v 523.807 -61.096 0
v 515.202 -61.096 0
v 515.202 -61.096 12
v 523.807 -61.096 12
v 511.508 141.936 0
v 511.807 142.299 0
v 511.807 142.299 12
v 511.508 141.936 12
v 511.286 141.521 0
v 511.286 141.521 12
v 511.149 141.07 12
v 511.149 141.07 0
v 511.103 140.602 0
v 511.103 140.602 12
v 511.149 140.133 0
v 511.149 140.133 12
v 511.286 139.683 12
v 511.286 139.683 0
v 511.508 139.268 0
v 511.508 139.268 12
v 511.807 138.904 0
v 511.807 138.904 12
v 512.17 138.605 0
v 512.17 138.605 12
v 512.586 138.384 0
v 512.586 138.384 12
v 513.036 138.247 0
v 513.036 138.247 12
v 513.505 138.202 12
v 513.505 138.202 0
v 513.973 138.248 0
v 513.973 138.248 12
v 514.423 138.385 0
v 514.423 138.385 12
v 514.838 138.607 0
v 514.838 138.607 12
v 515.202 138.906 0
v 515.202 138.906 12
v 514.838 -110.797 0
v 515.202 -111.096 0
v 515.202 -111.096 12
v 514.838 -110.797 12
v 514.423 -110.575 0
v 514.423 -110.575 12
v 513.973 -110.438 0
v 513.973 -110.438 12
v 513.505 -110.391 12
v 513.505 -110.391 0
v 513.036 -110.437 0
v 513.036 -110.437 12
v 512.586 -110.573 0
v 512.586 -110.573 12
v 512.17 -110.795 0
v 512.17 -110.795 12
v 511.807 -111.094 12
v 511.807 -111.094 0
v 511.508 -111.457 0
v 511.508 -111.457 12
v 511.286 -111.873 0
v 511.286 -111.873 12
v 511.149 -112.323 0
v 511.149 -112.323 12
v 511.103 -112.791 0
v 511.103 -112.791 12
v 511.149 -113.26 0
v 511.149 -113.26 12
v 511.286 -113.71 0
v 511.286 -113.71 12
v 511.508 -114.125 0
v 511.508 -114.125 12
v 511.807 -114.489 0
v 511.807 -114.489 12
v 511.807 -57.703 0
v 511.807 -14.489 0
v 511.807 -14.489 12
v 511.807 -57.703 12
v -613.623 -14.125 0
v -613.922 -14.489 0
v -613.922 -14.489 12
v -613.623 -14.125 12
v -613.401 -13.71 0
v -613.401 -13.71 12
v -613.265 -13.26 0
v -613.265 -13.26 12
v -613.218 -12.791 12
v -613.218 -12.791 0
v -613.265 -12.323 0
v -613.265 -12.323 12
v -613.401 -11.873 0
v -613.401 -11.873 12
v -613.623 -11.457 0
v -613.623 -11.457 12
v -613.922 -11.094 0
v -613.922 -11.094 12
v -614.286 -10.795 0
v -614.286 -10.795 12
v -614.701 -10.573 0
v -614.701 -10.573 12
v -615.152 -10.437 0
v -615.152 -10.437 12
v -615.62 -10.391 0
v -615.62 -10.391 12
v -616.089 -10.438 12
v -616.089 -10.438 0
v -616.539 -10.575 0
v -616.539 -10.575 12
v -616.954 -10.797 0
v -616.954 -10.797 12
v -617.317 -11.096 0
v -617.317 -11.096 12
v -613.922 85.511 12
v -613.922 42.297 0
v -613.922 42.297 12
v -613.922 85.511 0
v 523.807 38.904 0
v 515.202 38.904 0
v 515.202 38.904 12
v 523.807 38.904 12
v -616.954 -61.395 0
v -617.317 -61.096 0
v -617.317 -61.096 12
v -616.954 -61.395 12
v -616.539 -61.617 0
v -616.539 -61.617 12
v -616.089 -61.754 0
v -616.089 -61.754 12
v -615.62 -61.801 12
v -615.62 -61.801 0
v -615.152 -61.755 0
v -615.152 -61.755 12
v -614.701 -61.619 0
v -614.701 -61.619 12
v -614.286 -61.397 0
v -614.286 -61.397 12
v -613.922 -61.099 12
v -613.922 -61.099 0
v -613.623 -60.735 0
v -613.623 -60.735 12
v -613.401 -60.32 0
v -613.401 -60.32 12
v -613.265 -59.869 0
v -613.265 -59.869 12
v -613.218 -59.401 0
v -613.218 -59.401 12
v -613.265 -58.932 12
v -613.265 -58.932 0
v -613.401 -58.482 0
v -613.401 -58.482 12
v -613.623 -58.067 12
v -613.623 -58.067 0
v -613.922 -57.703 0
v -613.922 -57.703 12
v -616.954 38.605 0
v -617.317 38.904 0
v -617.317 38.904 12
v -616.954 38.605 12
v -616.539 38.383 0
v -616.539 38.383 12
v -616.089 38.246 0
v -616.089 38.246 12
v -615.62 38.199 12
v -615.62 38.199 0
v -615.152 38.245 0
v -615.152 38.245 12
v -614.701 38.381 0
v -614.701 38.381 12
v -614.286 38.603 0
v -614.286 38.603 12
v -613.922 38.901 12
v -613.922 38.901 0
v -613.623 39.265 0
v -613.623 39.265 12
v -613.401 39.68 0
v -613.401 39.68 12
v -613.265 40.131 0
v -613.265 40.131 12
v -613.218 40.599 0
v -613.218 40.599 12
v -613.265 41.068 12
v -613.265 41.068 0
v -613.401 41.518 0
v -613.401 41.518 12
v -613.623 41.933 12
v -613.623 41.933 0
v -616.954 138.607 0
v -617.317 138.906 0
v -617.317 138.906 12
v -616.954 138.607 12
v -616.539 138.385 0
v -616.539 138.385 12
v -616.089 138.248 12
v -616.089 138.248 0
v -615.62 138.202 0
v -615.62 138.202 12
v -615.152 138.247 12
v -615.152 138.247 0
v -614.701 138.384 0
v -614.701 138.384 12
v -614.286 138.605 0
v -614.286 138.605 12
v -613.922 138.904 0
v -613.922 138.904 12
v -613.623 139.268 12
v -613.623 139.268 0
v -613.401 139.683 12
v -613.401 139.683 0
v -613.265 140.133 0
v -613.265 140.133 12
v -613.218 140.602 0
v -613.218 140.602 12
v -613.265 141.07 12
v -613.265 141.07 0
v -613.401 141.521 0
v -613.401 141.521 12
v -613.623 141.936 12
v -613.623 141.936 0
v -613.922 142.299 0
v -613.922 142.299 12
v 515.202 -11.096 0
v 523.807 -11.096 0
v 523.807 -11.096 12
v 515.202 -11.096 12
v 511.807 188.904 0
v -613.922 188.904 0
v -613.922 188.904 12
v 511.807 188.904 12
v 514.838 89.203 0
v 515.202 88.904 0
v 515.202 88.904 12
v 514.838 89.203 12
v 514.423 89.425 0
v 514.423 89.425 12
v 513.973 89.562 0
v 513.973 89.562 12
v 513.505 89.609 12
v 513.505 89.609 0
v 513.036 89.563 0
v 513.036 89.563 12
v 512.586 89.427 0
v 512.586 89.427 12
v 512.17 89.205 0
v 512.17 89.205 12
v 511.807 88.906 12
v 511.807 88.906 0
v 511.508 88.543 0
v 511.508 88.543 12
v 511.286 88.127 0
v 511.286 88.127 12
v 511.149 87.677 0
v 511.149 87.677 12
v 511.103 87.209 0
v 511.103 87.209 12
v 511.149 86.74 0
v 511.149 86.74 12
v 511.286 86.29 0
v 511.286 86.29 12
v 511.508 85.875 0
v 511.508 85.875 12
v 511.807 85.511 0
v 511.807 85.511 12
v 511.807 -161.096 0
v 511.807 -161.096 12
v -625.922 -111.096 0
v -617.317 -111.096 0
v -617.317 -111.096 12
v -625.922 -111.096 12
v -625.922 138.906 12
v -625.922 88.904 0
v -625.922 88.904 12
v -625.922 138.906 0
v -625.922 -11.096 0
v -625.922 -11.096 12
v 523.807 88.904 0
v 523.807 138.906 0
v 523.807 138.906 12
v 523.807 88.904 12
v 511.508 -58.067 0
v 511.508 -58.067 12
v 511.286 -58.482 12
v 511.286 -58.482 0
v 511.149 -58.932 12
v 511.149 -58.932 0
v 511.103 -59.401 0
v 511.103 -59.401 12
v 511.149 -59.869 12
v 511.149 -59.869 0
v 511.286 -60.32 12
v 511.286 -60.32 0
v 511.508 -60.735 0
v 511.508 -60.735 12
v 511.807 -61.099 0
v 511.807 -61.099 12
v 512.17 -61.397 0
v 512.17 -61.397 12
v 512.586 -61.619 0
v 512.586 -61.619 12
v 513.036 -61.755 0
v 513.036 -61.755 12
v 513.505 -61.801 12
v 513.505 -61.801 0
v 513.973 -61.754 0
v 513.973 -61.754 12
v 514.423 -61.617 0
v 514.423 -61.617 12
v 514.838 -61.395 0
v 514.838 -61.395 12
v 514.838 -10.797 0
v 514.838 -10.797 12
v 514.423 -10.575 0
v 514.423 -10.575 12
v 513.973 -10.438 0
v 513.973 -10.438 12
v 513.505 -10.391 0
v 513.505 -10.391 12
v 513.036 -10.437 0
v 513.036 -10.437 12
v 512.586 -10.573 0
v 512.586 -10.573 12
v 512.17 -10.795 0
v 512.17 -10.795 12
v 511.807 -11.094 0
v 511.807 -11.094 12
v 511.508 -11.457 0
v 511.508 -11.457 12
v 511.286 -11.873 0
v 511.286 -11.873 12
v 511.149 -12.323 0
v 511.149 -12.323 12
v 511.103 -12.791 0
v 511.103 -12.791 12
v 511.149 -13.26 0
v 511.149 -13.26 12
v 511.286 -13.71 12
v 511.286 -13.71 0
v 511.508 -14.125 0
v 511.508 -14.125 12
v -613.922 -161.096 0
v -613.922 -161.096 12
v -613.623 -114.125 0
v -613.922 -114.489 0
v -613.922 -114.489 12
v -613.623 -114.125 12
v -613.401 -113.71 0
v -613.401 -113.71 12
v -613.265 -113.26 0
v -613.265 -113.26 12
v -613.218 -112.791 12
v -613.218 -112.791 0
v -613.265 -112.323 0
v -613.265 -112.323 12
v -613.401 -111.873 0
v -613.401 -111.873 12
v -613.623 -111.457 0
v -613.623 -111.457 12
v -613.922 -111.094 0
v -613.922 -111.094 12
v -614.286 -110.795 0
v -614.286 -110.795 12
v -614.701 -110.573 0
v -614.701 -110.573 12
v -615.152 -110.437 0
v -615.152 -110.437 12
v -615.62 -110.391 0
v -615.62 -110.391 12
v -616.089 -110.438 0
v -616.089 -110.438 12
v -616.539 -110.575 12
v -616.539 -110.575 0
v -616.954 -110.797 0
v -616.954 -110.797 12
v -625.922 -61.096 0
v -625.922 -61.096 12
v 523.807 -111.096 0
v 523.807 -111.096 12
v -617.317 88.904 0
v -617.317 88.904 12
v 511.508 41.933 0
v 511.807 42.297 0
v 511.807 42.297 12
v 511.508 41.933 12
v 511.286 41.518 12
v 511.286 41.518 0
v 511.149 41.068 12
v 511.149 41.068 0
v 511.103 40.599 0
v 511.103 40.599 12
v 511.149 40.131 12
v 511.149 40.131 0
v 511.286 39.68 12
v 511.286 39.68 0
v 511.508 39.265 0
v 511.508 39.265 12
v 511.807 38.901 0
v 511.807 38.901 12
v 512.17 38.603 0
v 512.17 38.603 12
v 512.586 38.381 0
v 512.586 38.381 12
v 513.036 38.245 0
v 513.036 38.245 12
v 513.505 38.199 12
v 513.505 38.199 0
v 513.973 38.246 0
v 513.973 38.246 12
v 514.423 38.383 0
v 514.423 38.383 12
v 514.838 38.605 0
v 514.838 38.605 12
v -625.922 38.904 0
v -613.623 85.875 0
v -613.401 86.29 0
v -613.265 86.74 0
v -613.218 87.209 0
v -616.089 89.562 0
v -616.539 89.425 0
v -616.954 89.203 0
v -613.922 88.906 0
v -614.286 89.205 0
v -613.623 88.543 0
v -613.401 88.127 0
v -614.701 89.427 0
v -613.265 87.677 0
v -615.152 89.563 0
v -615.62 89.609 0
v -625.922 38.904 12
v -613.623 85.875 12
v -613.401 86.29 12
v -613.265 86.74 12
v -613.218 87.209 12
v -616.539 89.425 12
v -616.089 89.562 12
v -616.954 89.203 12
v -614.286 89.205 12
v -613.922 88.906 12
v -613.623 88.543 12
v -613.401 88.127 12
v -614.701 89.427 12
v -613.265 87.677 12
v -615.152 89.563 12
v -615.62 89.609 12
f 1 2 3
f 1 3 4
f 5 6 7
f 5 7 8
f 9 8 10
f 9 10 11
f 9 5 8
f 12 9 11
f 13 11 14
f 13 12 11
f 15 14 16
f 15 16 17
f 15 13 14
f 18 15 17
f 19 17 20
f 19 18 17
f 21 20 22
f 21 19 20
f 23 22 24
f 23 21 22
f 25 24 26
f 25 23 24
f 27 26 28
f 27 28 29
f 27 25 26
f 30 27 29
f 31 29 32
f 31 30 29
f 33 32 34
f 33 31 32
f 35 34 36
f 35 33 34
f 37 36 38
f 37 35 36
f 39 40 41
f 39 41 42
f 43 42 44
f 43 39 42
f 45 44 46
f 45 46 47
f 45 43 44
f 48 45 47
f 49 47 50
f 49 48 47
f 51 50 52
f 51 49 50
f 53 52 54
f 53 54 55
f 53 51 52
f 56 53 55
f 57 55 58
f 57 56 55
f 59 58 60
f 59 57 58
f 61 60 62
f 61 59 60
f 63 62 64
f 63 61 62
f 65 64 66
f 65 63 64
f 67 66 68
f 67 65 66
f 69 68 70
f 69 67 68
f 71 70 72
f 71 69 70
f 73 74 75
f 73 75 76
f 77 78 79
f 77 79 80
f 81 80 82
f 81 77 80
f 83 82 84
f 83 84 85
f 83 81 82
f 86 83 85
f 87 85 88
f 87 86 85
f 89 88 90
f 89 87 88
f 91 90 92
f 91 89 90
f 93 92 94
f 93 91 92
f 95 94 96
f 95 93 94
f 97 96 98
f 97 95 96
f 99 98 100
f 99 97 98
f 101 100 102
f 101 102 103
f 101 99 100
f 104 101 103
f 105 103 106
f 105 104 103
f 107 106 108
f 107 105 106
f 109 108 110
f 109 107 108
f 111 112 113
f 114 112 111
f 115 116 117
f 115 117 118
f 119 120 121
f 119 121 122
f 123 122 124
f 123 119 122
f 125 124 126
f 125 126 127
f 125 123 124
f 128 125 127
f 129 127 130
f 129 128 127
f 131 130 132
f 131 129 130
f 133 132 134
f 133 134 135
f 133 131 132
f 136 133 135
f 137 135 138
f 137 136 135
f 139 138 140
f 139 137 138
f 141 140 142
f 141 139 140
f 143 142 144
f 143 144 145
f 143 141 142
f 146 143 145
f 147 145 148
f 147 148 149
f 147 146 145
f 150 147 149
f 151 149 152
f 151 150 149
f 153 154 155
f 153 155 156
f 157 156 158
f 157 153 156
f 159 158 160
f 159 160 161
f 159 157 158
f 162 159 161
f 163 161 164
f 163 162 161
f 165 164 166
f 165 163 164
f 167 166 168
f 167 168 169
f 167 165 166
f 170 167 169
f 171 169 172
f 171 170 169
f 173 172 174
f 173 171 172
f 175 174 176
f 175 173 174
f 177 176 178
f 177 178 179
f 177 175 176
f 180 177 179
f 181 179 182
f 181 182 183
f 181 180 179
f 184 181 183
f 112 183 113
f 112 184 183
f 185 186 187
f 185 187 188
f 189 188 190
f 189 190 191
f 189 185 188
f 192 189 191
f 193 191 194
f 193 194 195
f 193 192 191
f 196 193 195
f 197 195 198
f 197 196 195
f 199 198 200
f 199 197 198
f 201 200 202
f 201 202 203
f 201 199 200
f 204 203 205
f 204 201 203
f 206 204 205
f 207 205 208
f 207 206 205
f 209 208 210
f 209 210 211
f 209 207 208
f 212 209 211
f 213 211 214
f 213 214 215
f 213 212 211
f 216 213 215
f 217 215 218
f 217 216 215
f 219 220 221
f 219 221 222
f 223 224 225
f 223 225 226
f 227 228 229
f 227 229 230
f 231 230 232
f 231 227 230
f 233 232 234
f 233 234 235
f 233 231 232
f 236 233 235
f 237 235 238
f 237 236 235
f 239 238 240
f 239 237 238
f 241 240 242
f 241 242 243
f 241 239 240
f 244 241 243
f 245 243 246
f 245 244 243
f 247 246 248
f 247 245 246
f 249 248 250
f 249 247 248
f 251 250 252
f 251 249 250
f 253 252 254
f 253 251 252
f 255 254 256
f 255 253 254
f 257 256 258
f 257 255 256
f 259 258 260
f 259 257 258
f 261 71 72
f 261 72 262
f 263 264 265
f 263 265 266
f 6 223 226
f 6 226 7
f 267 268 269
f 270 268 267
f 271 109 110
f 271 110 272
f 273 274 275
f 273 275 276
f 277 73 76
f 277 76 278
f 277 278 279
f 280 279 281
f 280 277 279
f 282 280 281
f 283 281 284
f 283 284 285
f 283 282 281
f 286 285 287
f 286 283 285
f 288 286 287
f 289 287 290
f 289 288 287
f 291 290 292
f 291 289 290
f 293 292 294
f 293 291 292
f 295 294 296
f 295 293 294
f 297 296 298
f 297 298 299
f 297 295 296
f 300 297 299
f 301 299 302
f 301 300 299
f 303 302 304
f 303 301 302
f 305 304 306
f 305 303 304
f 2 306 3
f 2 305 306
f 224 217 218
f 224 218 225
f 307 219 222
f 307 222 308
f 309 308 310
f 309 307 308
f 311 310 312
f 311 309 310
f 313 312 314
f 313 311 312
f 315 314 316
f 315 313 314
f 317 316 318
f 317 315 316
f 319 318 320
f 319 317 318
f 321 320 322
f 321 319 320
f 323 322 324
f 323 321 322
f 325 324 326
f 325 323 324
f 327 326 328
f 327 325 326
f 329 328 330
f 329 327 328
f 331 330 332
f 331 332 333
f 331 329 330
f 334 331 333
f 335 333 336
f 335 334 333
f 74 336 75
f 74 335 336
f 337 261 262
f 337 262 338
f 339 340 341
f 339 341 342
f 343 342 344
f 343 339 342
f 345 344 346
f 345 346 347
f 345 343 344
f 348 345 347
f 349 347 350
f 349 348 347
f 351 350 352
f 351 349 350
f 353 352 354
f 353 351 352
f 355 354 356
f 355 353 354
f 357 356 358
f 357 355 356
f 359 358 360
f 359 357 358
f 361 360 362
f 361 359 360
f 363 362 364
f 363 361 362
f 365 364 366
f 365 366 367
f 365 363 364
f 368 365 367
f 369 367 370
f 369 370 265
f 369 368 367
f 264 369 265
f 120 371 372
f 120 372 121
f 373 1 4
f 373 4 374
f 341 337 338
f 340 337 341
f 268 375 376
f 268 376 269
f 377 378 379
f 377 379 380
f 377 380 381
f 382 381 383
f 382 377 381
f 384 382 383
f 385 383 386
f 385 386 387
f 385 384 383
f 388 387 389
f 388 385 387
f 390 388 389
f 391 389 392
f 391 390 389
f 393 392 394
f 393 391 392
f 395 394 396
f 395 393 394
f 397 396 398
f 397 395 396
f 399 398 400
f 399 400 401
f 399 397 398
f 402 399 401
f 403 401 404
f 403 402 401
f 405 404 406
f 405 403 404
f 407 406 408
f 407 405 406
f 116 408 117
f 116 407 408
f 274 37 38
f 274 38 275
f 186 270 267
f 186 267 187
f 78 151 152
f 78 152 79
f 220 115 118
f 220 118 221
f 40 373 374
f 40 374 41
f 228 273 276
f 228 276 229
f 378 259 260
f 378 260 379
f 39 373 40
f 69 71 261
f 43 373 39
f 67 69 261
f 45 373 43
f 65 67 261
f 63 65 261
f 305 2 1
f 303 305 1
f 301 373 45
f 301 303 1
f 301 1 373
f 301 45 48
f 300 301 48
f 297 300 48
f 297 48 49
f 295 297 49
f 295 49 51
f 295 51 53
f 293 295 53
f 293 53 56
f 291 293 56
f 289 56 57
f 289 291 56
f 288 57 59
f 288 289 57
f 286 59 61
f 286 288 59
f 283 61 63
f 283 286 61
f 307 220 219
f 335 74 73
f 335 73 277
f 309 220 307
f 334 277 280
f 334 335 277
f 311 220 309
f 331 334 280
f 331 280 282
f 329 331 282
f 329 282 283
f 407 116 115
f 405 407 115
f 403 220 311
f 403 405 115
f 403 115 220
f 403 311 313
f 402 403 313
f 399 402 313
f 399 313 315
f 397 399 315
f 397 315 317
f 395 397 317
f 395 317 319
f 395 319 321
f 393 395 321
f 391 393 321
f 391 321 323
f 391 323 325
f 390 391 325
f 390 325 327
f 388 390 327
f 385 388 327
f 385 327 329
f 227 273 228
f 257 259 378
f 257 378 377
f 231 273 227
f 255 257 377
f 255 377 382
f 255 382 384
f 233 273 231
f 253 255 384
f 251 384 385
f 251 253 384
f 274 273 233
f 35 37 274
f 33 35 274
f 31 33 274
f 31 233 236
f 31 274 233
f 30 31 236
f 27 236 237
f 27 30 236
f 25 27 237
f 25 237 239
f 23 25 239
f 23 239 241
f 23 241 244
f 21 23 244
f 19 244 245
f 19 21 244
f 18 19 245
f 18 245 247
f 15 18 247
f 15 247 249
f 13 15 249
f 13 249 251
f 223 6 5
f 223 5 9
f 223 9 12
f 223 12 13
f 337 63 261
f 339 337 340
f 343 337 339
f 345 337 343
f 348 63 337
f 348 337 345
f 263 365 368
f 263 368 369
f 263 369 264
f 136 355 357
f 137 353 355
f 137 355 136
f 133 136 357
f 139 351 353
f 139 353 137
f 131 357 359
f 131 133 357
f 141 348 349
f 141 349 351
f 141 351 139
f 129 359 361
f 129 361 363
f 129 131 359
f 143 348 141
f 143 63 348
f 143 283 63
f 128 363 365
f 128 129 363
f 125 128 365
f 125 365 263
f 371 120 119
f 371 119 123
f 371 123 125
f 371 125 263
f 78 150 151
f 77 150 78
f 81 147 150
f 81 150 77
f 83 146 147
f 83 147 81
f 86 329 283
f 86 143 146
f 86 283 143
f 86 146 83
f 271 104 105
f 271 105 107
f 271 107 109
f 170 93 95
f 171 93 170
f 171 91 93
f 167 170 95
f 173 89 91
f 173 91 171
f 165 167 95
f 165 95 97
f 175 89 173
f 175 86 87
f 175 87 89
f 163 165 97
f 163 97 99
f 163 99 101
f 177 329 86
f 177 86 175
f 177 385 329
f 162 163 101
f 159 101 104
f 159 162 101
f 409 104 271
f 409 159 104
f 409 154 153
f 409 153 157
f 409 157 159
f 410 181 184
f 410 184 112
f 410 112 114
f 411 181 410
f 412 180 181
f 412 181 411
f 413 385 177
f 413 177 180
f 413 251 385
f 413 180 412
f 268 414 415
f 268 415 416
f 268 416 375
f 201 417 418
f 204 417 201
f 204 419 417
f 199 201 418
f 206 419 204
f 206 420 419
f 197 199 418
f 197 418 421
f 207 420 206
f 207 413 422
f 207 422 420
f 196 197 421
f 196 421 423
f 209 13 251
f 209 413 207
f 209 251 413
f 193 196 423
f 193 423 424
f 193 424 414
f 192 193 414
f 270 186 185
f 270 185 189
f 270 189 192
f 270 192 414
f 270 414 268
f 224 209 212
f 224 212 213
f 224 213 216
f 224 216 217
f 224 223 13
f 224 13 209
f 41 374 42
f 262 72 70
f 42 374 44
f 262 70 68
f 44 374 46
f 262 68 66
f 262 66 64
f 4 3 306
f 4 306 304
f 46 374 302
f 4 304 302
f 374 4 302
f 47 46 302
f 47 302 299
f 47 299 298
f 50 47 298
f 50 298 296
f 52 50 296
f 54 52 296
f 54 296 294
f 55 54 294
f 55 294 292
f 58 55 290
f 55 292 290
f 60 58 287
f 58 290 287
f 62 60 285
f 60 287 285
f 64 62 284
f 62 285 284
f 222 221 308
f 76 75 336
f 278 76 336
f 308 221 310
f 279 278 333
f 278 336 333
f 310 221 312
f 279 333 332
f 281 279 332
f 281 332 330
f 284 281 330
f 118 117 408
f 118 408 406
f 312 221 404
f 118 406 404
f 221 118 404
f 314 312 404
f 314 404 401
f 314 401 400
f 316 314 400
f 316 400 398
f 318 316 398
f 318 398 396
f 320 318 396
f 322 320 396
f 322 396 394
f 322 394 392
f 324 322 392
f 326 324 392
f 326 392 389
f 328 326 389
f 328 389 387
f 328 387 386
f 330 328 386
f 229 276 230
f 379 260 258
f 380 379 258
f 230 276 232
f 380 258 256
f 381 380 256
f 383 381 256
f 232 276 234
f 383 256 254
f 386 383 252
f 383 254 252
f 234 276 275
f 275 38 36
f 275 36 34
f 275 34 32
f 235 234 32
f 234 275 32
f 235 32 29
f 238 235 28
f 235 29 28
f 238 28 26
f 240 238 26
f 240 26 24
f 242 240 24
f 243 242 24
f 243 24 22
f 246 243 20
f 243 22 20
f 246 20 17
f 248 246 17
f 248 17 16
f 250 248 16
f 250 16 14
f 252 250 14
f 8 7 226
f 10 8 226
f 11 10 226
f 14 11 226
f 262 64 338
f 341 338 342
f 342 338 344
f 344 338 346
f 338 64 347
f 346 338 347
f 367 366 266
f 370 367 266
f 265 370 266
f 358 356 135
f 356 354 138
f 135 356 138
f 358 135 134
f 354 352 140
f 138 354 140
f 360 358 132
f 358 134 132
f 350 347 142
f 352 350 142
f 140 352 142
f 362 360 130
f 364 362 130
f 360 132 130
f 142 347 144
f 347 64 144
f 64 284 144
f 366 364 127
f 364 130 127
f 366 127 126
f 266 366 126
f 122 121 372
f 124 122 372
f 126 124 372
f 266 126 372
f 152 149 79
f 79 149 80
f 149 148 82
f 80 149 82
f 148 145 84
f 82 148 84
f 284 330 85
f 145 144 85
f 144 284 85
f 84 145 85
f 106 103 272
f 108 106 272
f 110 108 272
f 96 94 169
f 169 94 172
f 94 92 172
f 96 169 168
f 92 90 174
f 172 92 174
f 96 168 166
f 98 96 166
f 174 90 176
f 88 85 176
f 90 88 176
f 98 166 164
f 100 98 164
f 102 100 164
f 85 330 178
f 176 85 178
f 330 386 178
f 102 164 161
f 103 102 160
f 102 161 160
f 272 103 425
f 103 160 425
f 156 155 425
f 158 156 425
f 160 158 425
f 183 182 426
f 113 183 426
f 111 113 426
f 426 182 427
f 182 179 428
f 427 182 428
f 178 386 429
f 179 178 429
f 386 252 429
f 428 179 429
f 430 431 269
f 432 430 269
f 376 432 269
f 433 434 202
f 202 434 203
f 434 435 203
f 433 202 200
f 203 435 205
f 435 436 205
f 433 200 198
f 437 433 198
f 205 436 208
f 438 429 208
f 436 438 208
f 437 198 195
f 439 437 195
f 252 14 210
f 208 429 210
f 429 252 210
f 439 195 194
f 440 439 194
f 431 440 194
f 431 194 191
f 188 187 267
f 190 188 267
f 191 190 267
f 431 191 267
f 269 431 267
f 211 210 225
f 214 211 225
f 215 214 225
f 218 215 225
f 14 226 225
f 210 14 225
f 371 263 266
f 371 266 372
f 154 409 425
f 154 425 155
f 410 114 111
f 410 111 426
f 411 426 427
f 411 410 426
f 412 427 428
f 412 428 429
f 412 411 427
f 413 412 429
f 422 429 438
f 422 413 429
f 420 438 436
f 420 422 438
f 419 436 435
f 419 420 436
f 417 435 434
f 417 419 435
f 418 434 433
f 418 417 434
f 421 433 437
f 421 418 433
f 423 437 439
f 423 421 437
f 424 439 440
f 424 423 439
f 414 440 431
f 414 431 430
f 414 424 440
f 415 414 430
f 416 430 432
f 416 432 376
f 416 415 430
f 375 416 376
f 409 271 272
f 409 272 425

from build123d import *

# Parameters (mm, degrees)
BOSS_EXTRUDE1_DEPTH = 12


with BuildPart() as part:
    # Sketch1 → Boss-Extrude1 (new body)
    with BuildSketch(Plane.XY):
        with BuildLine():
            Line((511.8067094, 188.903885219), (511.8067094, 142.299329353))
            ThreePointArc((511.8067094, 142.299329353), (511.806507744, 138.903885219), (515.20195099, 138.906348311))
            Line((515.20195099, 138.906348311), (523.8067094, 138.906348311))
            Line((523.8067094, 138.906348311), (523.8067094, 138.319810176))
            Line((523.8067094, 138.319810176), (523.8067094, 88.903885219))
            Line((523.8067094, 88.903885219), (518.8067094, 88.903885219))
            Line((518.8067094, 88.903885219), (515.20195099, 88.903885219))
            ThreePointArc((515.20195099, 88.903885219), (511.806507744, 88.906348311), (511.8067094, 85.510904177))
            Line((511.8067094, 85.510904177), (511.8067094, 42.296866261))
            ThreePointArc((511.8067094, 42.296866261), (511.806507744, 38.901422127), (515.20195099, 38.903885219))
            Line((515.20195099, 38.903885219), (518.8067094, 38.903885219))
            Line((518.8067094, 38.903885219), (523.8067094, 38.903885219))
            Line((523.8067094, 38.903885219), (523.8067094, -11.096114781))
            Line((523.8067094, -11.096114781), (518.8067094, -11.096114781))
            Line((518.8067094, -11.096114781), (515.20195099, -11.096114781))
            ThreePointArc((515.20195099, -11.096114781), (511.806507744, -11.093651689), (511.8067094, -14.489095823))
            Line((511.8067094, -14.489095823), (511.8067094, -57.703133739))
            ThreePointArc((511.8067094, -57.703133739), (511.806507744, -61.098577873), (515.20195099, -61.096114781))
            Line((515.20195099, -61.096114781), (518.8067094, -61.096114781))
            Line((518.8067094, -61.096114781), (523.8067094, -61.096114781))
            Line((523.8067094, -61.096114781), (523.8067094, -111.096114781))
            Line((523.8067094, -111.096114781), (518.8067094, -111.096114781))
            Line((518.8067094, -111.096114781), (515.20195099, -111.096114781))
            ThreePointArc((515.20195099, -111.096114781), (511.806507744, -111.093651689), (511.8067094, -114.489095823))
            Line((511.8067094, -114.489095823), (511.8067094, -161.096114781))
            Line((511.8067094, -161.096114781), (-613.922135209, -161.096114781))
            Line((-613.922135209, -161.096114781), (-613.922135209, -114.489095823))
            ThreePointArc((-613.922135209, -114.489095823), (-613.921933554, -111.093651689), (-617.3173768, -111.096114781))
            Line((-617.3173768, -111.096114781), (-620.922135209, -111.096114781))
            Line((-620.922135209, -111.096114781), (-625.922135209, -111.096114781))
            Line((-625.922135209, -111.096114781), (-625.922135209, -61.096114781))
            Line((-625.922135209, -61.096114781), (-620.922135209, -61.096114781))
            Line((-620.922135209, -61.096114781), (-617.3173768, -61.096114781))
            ThreePointArc((-617.3173768, -61.096114781), (-613.921933554, -61.098577873), (-613.922135209, -57.703133739))
            Line((-613.922135209, -57.703133739), (-613.922135209, -14.489095823))
            ThreePointArc((-613.922135209, -14.489095823), (-613.921933554, -11.093651689), (-617.3173768, -11.096114781))
            Line((-617.3173768, -11.096114781), (-620.922135209, -11.096114781))
            Line((-620.922135209, -11.096114781), (-625.922135209, -11.096114781))
            Line((-625.922135209, -11.096114781), (-625.922135209, 38.903885219))
            Line((-625.922135209, 38.903885219), (-620.922135209, 38.903885219))
            Line((-620.922135209, 38.903885219), (-617.3173768, 38.903885219))
            ThreePointArc((-617.3173768, 38.903885219), (-613.921933554, 38.901422127), (-613.922135209, 42.296866261))
            Line((-613.922135209, 42.296866261), (-613.922135209, 85.510904177))
            ThreePointArc((-613.922135209, 85.510904177), (-613.921933554, 88.906348311), (-617.3173768, 88.903885219))
            Line((-617.3173768, 88.903885219), (-620.922135209, 88.903885219))
            Line((-620.922135209, 88.903885219), (-625.922135209, 88.903885219))
            Line((-625.922135209, 88.903885219), (-625.922135209, 138.319810176))
            Line((-625.922135209, 138.319810176), (-625.922135209, 138.906348311))
            Line((-625.922135209, 138.906348311), (-617.3173768, 138.906348311))
            ThreePointArc((-617.3173768, 138.906348311), (-613.921933554, 138.903885219), (-613.922135209, 142.299329353))
            Line((-613.922135209, 142.299329353), (-613.922135209, 188.903885219))
            Line((-613.922135209, 188.903885219), (511.8067094, 188.903885219))
        make_face()
    extrude(amount=BOSS_EXTRUDE1_DEPTH)


solid = part.part
